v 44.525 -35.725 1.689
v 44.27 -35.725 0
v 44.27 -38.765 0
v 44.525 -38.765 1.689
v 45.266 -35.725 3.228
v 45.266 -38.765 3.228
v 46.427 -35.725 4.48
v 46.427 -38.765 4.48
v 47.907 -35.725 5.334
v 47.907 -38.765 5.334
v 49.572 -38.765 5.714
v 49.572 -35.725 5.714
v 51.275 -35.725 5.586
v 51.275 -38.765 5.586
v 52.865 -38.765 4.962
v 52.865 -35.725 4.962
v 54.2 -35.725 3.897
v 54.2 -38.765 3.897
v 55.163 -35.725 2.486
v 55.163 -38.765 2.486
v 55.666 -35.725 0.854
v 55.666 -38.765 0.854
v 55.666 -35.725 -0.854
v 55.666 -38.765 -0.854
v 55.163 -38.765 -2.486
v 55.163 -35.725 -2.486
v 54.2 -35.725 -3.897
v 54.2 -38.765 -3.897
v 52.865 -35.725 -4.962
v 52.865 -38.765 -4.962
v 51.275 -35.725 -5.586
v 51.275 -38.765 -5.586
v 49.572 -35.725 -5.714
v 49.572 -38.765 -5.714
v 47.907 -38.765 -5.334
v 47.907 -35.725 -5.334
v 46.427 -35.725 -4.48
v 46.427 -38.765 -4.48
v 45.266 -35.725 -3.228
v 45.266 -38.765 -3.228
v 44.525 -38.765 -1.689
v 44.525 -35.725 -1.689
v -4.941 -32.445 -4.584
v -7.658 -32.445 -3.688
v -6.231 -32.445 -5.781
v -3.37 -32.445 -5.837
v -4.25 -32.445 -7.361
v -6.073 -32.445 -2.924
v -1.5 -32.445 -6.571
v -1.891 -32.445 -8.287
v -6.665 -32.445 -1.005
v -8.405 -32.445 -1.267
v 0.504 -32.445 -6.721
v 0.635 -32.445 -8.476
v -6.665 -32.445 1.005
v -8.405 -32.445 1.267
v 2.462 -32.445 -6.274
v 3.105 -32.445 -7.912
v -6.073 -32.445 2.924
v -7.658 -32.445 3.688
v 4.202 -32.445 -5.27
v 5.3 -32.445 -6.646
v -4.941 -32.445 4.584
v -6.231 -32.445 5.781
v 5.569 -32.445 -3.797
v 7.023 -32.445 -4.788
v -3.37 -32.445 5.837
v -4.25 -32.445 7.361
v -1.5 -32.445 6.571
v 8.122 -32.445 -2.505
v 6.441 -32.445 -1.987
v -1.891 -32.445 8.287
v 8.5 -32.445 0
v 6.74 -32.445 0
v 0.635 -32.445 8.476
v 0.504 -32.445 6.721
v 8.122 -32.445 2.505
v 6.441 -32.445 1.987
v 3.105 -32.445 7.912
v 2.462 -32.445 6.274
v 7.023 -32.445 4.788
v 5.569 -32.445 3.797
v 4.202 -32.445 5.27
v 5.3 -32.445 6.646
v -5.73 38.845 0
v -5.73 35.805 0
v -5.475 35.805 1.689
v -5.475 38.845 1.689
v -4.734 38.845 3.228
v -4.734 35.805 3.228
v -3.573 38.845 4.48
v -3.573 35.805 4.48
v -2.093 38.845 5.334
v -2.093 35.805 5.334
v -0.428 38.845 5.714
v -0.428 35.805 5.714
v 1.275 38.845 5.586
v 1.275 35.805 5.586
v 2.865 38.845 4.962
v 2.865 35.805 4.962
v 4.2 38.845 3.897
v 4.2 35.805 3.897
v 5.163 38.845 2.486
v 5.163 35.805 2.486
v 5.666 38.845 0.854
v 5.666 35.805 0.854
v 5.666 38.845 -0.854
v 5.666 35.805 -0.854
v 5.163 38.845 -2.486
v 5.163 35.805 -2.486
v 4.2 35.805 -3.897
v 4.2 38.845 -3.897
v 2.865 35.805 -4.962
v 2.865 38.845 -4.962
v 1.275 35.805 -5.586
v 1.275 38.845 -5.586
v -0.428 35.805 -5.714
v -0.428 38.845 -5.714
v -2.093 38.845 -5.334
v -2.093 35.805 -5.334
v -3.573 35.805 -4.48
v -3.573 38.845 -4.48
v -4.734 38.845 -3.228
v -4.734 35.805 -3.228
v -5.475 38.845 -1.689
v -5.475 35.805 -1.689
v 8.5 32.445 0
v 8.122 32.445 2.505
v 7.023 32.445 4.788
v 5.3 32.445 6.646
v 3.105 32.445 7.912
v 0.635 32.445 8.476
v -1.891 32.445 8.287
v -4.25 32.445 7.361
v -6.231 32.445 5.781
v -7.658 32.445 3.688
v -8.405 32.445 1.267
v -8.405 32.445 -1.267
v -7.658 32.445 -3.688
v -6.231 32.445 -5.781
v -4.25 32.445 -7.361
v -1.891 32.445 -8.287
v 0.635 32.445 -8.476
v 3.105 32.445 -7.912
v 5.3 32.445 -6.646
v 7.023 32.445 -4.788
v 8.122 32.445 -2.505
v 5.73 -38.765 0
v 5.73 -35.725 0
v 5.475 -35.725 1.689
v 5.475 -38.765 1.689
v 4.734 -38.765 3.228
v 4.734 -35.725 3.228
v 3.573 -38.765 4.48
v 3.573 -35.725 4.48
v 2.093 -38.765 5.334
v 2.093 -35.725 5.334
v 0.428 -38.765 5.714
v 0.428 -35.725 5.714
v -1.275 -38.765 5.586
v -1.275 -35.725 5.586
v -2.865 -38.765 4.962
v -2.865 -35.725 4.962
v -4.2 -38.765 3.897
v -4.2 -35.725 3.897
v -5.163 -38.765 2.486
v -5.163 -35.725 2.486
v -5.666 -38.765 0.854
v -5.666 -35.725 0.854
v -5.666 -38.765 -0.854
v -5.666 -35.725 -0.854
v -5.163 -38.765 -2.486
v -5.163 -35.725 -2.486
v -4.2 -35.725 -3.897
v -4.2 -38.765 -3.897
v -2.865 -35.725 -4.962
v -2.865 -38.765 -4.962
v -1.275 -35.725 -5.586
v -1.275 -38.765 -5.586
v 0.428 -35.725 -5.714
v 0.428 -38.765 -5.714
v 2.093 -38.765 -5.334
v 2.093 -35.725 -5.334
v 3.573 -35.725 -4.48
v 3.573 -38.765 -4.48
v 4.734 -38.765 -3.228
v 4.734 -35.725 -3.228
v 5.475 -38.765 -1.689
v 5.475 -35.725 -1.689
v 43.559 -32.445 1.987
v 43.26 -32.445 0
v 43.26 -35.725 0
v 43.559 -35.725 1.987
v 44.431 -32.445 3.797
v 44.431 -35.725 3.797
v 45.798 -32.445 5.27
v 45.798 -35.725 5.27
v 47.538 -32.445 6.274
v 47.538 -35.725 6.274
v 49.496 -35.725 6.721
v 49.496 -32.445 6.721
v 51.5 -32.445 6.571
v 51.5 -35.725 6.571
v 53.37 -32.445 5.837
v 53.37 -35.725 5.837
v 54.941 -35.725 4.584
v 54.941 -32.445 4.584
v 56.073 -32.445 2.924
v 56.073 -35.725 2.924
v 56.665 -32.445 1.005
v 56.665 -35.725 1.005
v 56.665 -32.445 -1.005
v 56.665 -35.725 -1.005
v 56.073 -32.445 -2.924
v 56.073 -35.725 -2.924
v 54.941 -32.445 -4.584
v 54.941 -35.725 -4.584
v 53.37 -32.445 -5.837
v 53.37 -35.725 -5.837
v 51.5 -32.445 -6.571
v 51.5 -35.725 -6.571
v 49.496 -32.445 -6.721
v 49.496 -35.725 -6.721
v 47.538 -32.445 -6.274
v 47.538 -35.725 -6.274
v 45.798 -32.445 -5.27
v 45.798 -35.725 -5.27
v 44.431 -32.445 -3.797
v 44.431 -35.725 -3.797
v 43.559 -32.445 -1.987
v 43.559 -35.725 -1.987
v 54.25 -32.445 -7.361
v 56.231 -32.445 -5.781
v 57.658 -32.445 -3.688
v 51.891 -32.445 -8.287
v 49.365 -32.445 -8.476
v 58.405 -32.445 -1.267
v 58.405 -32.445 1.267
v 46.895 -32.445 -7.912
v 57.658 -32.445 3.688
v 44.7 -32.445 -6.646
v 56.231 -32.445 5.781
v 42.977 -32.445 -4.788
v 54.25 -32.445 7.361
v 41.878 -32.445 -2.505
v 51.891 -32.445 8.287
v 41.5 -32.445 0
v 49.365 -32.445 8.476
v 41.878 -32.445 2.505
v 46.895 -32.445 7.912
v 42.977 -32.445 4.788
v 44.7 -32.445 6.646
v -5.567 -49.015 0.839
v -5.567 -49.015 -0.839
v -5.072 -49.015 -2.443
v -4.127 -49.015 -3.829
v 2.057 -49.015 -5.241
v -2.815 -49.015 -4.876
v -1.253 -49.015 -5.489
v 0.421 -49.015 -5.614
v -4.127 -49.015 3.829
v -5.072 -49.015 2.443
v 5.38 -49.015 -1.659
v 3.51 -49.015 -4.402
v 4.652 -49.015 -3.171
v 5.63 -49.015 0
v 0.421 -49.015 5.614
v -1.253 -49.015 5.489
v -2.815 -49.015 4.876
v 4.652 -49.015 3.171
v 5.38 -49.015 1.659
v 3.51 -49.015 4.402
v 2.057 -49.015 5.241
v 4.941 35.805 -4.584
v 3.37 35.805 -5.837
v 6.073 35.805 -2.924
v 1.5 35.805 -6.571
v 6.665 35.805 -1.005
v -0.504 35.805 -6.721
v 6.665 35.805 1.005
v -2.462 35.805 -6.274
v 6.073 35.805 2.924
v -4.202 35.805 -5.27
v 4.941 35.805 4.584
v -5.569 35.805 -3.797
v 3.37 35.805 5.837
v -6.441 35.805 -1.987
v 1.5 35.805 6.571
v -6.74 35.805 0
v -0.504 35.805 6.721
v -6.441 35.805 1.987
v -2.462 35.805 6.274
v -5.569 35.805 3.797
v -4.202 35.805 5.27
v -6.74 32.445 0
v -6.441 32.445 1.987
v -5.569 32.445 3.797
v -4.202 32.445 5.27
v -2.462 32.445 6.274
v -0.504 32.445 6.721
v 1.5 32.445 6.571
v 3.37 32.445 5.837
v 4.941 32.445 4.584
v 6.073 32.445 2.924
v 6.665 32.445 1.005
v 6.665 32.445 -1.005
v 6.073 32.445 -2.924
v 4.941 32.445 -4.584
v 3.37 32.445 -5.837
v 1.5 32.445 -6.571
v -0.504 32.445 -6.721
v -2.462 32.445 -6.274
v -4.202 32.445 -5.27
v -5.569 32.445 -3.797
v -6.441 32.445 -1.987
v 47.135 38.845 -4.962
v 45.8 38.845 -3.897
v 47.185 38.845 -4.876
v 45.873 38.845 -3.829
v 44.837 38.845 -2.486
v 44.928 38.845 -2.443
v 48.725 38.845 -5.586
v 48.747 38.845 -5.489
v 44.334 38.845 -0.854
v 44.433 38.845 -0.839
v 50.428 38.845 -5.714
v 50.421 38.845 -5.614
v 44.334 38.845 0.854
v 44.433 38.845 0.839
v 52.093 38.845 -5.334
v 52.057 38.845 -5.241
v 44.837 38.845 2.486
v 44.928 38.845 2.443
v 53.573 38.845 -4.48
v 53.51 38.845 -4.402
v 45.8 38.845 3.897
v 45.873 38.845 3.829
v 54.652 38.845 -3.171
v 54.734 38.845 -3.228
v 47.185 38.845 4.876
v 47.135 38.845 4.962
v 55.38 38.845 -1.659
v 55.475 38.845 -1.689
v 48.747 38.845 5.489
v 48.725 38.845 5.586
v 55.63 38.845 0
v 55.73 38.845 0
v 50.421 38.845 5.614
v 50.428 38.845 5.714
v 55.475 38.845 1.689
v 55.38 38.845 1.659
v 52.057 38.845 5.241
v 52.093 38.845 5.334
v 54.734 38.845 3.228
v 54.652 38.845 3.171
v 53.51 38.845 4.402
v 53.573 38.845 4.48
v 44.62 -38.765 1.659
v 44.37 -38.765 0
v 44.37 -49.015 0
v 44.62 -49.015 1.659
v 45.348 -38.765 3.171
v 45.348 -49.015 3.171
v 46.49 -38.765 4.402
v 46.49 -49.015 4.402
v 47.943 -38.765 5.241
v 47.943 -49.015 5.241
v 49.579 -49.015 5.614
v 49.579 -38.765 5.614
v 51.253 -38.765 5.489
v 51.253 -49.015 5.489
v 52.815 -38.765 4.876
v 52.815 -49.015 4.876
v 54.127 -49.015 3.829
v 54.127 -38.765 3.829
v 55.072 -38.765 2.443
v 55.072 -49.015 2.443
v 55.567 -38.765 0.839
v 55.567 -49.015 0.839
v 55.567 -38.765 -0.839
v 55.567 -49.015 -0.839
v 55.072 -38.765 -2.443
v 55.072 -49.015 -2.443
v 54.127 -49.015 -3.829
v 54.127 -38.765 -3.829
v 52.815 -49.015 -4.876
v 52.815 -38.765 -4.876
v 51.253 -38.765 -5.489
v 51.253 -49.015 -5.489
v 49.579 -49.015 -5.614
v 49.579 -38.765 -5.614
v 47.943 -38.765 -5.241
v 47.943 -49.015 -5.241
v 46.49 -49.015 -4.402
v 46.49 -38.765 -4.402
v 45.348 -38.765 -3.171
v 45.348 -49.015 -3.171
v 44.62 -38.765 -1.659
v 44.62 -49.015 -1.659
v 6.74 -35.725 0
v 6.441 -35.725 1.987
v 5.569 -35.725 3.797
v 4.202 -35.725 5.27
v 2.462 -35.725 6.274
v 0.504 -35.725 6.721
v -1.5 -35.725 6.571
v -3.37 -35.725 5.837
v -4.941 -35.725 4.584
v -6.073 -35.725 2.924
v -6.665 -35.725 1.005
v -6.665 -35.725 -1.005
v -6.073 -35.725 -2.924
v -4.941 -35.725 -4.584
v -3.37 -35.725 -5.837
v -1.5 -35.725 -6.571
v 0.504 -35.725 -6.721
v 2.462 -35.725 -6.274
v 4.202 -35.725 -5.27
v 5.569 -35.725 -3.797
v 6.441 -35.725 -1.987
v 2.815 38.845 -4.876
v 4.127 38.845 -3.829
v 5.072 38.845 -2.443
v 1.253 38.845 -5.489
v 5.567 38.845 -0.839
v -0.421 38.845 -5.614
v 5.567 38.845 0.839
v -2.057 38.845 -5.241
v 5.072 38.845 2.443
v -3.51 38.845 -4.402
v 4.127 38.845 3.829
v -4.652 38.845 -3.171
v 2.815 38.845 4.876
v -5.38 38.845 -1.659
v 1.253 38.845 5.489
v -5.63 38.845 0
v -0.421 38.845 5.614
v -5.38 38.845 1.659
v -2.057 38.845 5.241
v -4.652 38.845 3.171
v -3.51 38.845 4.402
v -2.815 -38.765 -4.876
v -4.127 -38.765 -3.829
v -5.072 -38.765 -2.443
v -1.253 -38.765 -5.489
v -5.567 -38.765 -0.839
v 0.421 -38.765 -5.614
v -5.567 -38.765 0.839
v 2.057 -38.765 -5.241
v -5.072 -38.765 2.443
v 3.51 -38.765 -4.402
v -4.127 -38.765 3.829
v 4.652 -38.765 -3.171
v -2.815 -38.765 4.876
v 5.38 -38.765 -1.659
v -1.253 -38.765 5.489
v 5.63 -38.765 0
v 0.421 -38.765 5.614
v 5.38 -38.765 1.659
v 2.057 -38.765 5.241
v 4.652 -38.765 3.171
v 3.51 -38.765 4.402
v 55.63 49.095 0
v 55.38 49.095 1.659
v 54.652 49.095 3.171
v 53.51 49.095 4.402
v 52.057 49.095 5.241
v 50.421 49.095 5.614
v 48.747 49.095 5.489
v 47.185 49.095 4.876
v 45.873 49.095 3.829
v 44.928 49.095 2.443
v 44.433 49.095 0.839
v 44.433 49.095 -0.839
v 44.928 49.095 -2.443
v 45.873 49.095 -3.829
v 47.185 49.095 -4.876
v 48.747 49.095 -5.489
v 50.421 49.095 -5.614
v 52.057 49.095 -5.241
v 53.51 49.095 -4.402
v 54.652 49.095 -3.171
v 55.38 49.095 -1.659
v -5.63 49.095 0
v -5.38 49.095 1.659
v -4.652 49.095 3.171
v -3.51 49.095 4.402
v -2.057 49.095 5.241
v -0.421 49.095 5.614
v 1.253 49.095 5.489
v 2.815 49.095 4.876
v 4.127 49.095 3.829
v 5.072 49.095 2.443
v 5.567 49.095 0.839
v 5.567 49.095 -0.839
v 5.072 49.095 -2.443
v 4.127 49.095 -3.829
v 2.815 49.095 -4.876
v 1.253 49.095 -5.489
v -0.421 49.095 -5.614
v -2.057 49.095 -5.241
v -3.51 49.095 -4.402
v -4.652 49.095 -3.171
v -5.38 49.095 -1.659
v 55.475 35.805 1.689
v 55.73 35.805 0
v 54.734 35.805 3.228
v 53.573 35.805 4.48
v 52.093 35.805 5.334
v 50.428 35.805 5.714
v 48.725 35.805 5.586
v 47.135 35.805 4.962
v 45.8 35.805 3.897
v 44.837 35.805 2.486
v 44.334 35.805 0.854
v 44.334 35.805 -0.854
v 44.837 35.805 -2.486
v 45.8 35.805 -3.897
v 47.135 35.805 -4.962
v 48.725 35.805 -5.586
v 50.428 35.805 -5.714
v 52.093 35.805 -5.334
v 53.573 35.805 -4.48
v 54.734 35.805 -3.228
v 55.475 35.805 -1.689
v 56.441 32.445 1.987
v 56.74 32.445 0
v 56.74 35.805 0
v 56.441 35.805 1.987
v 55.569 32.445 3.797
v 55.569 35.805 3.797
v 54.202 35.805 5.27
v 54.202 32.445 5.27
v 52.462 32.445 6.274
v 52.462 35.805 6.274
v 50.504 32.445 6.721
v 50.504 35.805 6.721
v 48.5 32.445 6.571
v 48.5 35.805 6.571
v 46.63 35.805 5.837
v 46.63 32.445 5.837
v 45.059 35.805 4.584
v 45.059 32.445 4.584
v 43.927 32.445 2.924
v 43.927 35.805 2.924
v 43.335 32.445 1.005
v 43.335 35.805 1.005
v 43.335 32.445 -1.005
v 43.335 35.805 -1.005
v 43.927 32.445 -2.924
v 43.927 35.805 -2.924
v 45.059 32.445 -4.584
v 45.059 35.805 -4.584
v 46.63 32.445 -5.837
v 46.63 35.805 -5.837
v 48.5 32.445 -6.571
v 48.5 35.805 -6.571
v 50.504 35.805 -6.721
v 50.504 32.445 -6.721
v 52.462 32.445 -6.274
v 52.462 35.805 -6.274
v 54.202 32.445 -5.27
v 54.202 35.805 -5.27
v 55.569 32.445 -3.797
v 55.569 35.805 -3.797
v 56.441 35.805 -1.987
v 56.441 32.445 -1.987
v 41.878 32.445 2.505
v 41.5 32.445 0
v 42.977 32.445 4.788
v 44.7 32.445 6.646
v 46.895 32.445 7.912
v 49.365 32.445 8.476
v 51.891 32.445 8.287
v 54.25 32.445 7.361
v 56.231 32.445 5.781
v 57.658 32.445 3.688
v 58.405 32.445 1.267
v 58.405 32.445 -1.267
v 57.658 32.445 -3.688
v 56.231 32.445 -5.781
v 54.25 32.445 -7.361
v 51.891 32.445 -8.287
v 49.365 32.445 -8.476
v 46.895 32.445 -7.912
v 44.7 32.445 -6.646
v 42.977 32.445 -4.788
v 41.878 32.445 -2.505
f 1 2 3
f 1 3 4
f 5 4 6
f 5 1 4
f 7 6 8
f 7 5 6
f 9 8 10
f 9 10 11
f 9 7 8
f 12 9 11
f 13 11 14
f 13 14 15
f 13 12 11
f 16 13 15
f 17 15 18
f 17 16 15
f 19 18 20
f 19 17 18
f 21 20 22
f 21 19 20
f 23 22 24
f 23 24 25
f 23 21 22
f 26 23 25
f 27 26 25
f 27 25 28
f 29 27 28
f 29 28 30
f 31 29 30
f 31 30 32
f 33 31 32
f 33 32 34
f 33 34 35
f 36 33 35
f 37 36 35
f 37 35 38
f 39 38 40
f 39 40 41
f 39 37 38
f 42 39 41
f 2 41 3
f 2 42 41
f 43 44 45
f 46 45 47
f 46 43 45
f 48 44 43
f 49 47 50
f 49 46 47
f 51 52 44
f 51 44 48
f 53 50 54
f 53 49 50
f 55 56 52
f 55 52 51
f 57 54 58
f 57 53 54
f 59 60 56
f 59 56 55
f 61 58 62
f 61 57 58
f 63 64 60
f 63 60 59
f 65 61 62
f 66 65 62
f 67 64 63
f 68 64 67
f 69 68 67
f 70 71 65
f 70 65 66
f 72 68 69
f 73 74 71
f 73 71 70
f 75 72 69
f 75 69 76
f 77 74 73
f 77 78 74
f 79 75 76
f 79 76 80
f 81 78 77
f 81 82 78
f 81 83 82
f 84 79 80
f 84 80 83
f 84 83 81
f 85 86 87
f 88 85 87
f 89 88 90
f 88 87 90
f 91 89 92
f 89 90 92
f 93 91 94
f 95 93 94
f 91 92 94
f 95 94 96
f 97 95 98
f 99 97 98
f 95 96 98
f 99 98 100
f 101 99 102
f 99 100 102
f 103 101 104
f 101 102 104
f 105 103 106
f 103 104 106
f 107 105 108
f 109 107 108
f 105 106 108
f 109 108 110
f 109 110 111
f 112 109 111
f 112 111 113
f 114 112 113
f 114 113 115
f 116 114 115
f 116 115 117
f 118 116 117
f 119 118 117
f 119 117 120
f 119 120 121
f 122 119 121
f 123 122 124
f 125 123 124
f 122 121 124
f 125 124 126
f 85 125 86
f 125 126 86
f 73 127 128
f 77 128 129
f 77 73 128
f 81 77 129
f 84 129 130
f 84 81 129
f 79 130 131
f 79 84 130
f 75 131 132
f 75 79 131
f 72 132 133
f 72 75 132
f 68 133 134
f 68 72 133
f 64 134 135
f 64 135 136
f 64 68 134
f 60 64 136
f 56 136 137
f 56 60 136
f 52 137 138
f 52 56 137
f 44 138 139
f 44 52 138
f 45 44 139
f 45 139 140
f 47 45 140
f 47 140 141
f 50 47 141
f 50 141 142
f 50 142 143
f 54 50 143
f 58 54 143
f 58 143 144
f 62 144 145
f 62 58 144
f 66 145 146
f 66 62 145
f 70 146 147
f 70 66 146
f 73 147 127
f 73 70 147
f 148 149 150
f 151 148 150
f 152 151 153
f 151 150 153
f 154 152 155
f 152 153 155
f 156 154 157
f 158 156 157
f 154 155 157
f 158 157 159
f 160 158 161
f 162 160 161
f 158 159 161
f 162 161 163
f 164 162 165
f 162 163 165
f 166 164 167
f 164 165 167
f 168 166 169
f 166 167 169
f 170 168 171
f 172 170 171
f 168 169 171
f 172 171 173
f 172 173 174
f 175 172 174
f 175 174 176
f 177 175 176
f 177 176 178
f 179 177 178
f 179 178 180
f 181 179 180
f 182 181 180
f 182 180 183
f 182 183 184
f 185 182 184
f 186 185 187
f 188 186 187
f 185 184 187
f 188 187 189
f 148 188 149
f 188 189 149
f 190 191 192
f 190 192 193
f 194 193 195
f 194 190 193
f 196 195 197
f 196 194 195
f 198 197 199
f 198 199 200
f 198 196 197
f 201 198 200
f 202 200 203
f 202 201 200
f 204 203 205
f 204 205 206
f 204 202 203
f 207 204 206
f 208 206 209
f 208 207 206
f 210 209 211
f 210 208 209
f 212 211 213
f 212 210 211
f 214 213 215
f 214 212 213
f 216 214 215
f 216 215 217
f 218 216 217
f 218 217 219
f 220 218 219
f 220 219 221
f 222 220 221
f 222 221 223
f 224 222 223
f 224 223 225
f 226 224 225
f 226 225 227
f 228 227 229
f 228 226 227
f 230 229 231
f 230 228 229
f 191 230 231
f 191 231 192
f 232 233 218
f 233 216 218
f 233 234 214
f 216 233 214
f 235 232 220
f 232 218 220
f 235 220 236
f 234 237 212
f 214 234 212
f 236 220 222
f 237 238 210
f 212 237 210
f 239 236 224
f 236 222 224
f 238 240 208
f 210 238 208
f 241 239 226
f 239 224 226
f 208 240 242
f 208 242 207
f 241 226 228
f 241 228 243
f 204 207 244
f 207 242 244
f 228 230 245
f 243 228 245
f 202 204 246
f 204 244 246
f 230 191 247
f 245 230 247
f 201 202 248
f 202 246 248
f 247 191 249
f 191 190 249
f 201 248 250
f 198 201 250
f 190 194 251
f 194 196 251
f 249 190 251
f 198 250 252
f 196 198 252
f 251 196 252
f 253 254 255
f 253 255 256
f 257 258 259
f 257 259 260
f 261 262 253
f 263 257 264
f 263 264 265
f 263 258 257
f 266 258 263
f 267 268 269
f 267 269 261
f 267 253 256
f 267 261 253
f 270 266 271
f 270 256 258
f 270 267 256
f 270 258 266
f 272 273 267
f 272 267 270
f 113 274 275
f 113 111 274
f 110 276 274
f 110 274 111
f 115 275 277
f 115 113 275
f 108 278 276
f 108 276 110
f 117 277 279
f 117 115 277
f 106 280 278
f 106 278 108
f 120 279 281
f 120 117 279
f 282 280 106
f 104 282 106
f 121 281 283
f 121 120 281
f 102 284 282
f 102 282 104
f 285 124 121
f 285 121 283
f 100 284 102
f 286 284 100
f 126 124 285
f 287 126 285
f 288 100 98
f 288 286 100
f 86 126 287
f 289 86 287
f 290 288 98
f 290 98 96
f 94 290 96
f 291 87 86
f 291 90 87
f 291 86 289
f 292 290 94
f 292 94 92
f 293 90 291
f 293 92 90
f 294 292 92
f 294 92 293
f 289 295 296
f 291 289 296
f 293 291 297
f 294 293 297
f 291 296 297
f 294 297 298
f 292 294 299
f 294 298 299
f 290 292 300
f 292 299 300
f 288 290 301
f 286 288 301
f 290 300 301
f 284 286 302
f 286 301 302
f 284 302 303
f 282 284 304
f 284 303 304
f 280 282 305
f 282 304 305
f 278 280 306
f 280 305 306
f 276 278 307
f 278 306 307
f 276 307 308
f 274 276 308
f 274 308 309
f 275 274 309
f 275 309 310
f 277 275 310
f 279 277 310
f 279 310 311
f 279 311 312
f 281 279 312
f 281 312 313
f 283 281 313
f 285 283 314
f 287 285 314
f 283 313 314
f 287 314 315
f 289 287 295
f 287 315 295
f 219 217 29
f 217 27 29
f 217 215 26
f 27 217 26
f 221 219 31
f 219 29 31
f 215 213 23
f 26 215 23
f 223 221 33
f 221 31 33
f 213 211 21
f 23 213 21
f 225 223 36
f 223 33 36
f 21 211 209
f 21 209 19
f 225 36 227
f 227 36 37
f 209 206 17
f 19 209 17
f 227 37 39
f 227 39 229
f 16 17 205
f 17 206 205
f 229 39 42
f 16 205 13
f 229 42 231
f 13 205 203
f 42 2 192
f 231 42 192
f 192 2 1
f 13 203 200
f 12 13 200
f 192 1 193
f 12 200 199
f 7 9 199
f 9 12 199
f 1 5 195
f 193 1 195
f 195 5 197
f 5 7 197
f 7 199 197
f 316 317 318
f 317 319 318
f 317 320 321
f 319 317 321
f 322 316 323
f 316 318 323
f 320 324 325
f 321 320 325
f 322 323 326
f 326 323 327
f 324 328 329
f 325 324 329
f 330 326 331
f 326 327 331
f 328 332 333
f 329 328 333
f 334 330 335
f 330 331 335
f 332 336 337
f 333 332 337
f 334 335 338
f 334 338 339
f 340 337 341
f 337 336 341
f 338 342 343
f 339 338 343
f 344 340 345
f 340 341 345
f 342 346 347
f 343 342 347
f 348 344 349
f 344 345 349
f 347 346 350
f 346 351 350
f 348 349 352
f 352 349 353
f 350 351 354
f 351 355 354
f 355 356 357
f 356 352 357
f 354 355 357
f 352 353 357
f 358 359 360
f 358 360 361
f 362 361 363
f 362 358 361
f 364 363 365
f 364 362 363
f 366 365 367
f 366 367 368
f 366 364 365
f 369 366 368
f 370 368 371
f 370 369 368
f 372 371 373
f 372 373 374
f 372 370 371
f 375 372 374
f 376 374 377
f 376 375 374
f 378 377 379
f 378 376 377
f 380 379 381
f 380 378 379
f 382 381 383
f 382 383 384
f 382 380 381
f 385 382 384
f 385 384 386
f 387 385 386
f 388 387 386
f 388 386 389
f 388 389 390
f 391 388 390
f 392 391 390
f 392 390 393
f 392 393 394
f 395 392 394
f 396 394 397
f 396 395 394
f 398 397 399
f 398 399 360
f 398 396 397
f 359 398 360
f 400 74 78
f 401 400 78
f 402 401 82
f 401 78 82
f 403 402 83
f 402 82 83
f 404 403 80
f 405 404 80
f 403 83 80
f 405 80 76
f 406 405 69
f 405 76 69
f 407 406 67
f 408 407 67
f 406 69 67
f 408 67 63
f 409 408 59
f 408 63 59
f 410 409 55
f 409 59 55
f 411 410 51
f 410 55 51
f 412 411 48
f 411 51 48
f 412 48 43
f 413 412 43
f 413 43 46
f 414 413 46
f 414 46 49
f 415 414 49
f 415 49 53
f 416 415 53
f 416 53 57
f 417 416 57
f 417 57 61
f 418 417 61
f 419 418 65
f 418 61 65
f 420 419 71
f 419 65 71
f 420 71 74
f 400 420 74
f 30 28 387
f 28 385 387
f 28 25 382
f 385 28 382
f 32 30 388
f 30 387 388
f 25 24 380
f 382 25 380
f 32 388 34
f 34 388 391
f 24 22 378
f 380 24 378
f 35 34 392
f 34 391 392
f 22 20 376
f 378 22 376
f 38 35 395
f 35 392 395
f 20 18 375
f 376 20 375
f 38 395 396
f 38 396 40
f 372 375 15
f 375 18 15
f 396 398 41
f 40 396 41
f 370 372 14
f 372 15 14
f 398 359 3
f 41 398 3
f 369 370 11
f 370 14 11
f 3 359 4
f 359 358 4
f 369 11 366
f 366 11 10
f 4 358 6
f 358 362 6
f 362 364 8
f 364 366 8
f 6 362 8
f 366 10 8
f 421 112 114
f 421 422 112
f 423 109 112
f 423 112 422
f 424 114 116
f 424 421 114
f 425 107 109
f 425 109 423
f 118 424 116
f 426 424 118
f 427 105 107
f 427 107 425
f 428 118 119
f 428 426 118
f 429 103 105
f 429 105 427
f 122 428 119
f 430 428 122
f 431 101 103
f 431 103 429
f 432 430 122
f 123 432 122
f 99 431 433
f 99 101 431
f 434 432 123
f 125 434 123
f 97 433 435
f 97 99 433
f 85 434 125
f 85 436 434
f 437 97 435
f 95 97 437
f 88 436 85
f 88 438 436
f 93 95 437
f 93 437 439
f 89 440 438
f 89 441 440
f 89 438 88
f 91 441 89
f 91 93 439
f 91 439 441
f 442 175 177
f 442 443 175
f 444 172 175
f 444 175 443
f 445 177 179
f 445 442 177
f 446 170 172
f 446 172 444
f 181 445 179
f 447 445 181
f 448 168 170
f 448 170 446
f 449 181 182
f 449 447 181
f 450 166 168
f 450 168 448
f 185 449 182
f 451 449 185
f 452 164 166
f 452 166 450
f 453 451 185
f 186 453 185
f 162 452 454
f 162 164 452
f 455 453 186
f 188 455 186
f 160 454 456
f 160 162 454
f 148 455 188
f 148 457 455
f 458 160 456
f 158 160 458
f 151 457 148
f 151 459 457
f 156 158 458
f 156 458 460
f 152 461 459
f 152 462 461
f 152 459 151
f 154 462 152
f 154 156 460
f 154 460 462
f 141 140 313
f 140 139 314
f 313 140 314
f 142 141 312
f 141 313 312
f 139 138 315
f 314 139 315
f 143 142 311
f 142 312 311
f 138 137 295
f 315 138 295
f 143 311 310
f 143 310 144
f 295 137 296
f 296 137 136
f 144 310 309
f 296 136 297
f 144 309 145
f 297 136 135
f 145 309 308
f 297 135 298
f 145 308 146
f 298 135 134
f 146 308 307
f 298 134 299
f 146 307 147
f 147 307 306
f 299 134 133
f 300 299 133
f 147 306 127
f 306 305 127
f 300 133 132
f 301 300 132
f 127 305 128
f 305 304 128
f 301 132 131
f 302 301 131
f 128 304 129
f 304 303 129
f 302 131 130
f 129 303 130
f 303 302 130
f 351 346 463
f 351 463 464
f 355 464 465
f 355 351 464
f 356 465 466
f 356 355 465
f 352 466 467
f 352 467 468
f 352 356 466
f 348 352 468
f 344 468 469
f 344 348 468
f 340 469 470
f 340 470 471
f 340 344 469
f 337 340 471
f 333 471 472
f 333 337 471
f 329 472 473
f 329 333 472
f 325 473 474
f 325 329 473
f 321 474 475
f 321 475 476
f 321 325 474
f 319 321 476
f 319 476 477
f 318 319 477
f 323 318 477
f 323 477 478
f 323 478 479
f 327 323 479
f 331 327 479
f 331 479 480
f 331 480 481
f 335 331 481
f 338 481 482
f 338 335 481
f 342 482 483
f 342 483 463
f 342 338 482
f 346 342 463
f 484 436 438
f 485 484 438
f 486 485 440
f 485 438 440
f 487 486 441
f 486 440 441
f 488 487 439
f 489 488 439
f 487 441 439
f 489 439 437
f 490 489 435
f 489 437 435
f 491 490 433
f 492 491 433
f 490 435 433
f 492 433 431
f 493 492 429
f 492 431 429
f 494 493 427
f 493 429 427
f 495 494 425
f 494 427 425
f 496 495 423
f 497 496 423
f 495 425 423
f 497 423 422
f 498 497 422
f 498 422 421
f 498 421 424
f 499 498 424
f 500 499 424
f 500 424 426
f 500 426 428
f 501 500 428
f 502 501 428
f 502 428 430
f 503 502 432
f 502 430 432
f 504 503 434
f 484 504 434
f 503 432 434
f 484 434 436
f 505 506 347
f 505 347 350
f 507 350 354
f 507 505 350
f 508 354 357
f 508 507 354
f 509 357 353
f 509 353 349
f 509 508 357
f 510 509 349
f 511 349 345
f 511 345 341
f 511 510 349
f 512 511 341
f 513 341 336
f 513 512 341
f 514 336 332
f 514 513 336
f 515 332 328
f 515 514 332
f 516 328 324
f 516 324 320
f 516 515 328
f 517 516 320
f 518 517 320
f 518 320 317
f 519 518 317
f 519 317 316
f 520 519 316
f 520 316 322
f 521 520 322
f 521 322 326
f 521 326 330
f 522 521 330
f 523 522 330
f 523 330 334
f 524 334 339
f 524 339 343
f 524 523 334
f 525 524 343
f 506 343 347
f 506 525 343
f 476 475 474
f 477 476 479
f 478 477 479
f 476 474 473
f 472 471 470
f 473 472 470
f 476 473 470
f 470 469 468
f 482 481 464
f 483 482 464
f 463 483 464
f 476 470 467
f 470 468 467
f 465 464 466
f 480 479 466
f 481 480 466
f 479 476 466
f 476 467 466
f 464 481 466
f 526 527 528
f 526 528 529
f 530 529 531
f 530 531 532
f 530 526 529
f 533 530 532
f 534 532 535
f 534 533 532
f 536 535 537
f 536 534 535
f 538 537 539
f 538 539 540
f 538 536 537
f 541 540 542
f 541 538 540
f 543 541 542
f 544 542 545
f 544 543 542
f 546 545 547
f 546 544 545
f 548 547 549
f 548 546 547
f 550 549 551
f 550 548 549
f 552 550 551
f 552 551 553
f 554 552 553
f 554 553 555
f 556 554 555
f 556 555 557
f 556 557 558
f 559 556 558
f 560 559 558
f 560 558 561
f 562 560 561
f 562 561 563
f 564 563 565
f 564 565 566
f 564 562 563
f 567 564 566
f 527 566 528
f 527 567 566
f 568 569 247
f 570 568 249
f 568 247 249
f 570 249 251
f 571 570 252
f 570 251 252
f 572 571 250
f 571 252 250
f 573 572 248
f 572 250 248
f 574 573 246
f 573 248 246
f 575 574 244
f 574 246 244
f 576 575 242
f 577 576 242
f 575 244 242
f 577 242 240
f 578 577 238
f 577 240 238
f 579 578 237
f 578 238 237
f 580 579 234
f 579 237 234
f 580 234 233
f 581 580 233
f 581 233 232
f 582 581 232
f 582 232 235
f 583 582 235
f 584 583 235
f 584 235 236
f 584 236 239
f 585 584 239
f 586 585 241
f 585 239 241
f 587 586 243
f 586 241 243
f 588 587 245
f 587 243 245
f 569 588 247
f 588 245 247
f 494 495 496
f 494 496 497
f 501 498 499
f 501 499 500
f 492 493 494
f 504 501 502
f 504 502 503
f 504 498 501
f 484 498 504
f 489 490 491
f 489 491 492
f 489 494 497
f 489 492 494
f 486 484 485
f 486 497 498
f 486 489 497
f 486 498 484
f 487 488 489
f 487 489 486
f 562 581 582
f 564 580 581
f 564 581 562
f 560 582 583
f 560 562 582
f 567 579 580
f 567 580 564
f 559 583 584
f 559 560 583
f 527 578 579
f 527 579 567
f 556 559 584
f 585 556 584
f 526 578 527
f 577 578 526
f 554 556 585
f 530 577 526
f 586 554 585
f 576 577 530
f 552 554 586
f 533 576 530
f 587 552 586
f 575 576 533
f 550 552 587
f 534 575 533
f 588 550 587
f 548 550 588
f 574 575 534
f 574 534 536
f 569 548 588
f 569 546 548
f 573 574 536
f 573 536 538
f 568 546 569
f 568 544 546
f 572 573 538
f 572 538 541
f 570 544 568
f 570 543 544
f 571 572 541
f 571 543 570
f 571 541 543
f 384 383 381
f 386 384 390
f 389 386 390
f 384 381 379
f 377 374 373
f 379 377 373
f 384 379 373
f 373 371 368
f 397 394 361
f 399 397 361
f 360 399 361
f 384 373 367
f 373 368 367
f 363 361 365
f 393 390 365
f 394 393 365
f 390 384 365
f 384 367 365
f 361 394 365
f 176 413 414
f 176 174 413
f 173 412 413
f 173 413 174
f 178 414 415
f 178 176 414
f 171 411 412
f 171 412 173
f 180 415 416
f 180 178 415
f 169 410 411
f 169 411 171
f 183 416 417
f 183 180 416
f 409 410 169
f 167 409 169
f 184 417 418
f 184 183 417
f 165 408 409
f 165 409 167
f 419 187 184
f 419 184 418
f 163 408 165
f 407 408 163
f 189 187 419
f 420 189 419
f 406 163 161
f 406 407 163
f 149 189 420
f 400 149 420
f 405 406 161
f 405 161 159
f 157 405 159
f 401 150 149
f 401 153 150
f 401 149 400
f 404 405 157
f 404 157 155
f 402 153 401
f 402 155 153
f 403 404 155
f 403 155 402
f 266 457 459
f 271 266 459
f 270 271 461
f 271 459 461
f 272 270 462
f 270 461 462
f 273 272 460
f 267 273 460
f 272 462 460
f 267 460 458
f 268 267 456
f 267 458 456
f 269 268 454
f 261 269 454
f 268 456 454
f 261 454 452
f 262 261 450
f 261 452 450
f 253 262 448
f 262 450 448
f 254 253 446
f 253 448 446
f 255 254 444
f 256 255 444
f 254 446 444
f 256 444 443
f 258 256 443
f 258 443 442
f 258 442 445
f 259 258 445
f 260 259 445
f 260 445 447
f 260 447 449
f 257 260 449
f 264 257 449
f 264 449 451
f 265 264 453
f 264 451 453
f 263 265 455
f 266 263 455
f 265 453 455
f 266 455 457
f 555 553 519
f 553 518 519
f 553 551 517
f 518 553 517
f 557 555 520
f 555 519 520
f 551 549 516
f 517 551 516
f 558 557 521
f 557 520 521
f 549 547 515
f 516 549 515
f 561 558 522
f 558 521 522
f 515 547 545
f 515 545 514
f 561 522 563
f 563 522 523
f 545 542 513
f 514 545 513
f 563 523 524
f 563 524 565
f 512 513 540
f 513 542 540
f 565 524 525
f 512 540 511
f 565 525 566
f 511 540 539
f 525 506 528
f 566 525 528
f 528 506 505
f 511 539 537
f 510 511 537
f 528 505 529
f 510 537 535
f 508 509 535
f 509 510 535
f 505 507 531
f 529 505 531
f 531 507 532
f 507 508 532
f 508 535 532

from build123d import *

# Parameters (mm, degrees)
F0_R      = 8.5
F1_DEPTH  = 32.445
F2_R      = 6.74
F3_DEPTH  = 3.28
F4_R      = 5.73
F5_DEPTH  = 3.04
F6_R      = 5.63
F7_DEPTH  = 10.25
F8_R      = 6.74
F9_DEPTH  = 3.36
F10_R     = 5.73
F11_DEPTH = 3.04
F12_R     = 5.63
F13_DEPTH = 10.25


with BuildPart() as f1:
    # F0 (on Front) → F1 (new body, symmetric)
    with BuildSketch(Plane.XZ):
        Circle(F0_R)
    extrude(amount=F1_DEPTH, both=True)

    # F2 (on face) → F3 (join)
    with BuildSketch(Plane.XZ.offset(32.445)):
        Circle(F2_R)
    extrude(amount=F3_DEPTH)

    # F4 (on face) → F5 (join)
    with BuildSketch(Plane.XZ.offset(35.725)):
        Circle(F4_R)
    extrude(amount=F5_DEPTH)

    # F6 (on face) → F7 (join)
    with BuildSketch(Plane.XZ.offset(38.765)):
        Circle(F6_R)
    extrude(amount=F7_DEPTH)

    # F8 (on face) → F9 (join)
    with BuildSketch(Plane(origin=(0, 32.445, 0), x_dir=(-1, 0, 0), z_dir=(0, 1, 0))):
        Circle(F8_R)
    extrude(amount=F9_DEPTH)

    # F10 (on face) → F11 (join)
    with BuildSketch(Plane(origin=(0, 35.805, 0), x_dir=(-1, 0, 0), z_dir=(0, 1, 0))):
        Circle(F10_R)
    extrude(amount=F11_DEPTH)

    # F12 (on face) → F13 (join)
    with BuildSketch(Plane(origin=(0, 38.845, 0), x_dir=(-1, 0, 0), z_dir=(0, 1, 0))):
        Circle(F12_R)
    extrude(amount=F13_DEPTH)


with BuildPart() as f15_1:
    # F15: instance of F1
    add(f1.part.mirror(Plane.YZ.offset(25)))


solid = Compound([f1.part, f15_1.part])
